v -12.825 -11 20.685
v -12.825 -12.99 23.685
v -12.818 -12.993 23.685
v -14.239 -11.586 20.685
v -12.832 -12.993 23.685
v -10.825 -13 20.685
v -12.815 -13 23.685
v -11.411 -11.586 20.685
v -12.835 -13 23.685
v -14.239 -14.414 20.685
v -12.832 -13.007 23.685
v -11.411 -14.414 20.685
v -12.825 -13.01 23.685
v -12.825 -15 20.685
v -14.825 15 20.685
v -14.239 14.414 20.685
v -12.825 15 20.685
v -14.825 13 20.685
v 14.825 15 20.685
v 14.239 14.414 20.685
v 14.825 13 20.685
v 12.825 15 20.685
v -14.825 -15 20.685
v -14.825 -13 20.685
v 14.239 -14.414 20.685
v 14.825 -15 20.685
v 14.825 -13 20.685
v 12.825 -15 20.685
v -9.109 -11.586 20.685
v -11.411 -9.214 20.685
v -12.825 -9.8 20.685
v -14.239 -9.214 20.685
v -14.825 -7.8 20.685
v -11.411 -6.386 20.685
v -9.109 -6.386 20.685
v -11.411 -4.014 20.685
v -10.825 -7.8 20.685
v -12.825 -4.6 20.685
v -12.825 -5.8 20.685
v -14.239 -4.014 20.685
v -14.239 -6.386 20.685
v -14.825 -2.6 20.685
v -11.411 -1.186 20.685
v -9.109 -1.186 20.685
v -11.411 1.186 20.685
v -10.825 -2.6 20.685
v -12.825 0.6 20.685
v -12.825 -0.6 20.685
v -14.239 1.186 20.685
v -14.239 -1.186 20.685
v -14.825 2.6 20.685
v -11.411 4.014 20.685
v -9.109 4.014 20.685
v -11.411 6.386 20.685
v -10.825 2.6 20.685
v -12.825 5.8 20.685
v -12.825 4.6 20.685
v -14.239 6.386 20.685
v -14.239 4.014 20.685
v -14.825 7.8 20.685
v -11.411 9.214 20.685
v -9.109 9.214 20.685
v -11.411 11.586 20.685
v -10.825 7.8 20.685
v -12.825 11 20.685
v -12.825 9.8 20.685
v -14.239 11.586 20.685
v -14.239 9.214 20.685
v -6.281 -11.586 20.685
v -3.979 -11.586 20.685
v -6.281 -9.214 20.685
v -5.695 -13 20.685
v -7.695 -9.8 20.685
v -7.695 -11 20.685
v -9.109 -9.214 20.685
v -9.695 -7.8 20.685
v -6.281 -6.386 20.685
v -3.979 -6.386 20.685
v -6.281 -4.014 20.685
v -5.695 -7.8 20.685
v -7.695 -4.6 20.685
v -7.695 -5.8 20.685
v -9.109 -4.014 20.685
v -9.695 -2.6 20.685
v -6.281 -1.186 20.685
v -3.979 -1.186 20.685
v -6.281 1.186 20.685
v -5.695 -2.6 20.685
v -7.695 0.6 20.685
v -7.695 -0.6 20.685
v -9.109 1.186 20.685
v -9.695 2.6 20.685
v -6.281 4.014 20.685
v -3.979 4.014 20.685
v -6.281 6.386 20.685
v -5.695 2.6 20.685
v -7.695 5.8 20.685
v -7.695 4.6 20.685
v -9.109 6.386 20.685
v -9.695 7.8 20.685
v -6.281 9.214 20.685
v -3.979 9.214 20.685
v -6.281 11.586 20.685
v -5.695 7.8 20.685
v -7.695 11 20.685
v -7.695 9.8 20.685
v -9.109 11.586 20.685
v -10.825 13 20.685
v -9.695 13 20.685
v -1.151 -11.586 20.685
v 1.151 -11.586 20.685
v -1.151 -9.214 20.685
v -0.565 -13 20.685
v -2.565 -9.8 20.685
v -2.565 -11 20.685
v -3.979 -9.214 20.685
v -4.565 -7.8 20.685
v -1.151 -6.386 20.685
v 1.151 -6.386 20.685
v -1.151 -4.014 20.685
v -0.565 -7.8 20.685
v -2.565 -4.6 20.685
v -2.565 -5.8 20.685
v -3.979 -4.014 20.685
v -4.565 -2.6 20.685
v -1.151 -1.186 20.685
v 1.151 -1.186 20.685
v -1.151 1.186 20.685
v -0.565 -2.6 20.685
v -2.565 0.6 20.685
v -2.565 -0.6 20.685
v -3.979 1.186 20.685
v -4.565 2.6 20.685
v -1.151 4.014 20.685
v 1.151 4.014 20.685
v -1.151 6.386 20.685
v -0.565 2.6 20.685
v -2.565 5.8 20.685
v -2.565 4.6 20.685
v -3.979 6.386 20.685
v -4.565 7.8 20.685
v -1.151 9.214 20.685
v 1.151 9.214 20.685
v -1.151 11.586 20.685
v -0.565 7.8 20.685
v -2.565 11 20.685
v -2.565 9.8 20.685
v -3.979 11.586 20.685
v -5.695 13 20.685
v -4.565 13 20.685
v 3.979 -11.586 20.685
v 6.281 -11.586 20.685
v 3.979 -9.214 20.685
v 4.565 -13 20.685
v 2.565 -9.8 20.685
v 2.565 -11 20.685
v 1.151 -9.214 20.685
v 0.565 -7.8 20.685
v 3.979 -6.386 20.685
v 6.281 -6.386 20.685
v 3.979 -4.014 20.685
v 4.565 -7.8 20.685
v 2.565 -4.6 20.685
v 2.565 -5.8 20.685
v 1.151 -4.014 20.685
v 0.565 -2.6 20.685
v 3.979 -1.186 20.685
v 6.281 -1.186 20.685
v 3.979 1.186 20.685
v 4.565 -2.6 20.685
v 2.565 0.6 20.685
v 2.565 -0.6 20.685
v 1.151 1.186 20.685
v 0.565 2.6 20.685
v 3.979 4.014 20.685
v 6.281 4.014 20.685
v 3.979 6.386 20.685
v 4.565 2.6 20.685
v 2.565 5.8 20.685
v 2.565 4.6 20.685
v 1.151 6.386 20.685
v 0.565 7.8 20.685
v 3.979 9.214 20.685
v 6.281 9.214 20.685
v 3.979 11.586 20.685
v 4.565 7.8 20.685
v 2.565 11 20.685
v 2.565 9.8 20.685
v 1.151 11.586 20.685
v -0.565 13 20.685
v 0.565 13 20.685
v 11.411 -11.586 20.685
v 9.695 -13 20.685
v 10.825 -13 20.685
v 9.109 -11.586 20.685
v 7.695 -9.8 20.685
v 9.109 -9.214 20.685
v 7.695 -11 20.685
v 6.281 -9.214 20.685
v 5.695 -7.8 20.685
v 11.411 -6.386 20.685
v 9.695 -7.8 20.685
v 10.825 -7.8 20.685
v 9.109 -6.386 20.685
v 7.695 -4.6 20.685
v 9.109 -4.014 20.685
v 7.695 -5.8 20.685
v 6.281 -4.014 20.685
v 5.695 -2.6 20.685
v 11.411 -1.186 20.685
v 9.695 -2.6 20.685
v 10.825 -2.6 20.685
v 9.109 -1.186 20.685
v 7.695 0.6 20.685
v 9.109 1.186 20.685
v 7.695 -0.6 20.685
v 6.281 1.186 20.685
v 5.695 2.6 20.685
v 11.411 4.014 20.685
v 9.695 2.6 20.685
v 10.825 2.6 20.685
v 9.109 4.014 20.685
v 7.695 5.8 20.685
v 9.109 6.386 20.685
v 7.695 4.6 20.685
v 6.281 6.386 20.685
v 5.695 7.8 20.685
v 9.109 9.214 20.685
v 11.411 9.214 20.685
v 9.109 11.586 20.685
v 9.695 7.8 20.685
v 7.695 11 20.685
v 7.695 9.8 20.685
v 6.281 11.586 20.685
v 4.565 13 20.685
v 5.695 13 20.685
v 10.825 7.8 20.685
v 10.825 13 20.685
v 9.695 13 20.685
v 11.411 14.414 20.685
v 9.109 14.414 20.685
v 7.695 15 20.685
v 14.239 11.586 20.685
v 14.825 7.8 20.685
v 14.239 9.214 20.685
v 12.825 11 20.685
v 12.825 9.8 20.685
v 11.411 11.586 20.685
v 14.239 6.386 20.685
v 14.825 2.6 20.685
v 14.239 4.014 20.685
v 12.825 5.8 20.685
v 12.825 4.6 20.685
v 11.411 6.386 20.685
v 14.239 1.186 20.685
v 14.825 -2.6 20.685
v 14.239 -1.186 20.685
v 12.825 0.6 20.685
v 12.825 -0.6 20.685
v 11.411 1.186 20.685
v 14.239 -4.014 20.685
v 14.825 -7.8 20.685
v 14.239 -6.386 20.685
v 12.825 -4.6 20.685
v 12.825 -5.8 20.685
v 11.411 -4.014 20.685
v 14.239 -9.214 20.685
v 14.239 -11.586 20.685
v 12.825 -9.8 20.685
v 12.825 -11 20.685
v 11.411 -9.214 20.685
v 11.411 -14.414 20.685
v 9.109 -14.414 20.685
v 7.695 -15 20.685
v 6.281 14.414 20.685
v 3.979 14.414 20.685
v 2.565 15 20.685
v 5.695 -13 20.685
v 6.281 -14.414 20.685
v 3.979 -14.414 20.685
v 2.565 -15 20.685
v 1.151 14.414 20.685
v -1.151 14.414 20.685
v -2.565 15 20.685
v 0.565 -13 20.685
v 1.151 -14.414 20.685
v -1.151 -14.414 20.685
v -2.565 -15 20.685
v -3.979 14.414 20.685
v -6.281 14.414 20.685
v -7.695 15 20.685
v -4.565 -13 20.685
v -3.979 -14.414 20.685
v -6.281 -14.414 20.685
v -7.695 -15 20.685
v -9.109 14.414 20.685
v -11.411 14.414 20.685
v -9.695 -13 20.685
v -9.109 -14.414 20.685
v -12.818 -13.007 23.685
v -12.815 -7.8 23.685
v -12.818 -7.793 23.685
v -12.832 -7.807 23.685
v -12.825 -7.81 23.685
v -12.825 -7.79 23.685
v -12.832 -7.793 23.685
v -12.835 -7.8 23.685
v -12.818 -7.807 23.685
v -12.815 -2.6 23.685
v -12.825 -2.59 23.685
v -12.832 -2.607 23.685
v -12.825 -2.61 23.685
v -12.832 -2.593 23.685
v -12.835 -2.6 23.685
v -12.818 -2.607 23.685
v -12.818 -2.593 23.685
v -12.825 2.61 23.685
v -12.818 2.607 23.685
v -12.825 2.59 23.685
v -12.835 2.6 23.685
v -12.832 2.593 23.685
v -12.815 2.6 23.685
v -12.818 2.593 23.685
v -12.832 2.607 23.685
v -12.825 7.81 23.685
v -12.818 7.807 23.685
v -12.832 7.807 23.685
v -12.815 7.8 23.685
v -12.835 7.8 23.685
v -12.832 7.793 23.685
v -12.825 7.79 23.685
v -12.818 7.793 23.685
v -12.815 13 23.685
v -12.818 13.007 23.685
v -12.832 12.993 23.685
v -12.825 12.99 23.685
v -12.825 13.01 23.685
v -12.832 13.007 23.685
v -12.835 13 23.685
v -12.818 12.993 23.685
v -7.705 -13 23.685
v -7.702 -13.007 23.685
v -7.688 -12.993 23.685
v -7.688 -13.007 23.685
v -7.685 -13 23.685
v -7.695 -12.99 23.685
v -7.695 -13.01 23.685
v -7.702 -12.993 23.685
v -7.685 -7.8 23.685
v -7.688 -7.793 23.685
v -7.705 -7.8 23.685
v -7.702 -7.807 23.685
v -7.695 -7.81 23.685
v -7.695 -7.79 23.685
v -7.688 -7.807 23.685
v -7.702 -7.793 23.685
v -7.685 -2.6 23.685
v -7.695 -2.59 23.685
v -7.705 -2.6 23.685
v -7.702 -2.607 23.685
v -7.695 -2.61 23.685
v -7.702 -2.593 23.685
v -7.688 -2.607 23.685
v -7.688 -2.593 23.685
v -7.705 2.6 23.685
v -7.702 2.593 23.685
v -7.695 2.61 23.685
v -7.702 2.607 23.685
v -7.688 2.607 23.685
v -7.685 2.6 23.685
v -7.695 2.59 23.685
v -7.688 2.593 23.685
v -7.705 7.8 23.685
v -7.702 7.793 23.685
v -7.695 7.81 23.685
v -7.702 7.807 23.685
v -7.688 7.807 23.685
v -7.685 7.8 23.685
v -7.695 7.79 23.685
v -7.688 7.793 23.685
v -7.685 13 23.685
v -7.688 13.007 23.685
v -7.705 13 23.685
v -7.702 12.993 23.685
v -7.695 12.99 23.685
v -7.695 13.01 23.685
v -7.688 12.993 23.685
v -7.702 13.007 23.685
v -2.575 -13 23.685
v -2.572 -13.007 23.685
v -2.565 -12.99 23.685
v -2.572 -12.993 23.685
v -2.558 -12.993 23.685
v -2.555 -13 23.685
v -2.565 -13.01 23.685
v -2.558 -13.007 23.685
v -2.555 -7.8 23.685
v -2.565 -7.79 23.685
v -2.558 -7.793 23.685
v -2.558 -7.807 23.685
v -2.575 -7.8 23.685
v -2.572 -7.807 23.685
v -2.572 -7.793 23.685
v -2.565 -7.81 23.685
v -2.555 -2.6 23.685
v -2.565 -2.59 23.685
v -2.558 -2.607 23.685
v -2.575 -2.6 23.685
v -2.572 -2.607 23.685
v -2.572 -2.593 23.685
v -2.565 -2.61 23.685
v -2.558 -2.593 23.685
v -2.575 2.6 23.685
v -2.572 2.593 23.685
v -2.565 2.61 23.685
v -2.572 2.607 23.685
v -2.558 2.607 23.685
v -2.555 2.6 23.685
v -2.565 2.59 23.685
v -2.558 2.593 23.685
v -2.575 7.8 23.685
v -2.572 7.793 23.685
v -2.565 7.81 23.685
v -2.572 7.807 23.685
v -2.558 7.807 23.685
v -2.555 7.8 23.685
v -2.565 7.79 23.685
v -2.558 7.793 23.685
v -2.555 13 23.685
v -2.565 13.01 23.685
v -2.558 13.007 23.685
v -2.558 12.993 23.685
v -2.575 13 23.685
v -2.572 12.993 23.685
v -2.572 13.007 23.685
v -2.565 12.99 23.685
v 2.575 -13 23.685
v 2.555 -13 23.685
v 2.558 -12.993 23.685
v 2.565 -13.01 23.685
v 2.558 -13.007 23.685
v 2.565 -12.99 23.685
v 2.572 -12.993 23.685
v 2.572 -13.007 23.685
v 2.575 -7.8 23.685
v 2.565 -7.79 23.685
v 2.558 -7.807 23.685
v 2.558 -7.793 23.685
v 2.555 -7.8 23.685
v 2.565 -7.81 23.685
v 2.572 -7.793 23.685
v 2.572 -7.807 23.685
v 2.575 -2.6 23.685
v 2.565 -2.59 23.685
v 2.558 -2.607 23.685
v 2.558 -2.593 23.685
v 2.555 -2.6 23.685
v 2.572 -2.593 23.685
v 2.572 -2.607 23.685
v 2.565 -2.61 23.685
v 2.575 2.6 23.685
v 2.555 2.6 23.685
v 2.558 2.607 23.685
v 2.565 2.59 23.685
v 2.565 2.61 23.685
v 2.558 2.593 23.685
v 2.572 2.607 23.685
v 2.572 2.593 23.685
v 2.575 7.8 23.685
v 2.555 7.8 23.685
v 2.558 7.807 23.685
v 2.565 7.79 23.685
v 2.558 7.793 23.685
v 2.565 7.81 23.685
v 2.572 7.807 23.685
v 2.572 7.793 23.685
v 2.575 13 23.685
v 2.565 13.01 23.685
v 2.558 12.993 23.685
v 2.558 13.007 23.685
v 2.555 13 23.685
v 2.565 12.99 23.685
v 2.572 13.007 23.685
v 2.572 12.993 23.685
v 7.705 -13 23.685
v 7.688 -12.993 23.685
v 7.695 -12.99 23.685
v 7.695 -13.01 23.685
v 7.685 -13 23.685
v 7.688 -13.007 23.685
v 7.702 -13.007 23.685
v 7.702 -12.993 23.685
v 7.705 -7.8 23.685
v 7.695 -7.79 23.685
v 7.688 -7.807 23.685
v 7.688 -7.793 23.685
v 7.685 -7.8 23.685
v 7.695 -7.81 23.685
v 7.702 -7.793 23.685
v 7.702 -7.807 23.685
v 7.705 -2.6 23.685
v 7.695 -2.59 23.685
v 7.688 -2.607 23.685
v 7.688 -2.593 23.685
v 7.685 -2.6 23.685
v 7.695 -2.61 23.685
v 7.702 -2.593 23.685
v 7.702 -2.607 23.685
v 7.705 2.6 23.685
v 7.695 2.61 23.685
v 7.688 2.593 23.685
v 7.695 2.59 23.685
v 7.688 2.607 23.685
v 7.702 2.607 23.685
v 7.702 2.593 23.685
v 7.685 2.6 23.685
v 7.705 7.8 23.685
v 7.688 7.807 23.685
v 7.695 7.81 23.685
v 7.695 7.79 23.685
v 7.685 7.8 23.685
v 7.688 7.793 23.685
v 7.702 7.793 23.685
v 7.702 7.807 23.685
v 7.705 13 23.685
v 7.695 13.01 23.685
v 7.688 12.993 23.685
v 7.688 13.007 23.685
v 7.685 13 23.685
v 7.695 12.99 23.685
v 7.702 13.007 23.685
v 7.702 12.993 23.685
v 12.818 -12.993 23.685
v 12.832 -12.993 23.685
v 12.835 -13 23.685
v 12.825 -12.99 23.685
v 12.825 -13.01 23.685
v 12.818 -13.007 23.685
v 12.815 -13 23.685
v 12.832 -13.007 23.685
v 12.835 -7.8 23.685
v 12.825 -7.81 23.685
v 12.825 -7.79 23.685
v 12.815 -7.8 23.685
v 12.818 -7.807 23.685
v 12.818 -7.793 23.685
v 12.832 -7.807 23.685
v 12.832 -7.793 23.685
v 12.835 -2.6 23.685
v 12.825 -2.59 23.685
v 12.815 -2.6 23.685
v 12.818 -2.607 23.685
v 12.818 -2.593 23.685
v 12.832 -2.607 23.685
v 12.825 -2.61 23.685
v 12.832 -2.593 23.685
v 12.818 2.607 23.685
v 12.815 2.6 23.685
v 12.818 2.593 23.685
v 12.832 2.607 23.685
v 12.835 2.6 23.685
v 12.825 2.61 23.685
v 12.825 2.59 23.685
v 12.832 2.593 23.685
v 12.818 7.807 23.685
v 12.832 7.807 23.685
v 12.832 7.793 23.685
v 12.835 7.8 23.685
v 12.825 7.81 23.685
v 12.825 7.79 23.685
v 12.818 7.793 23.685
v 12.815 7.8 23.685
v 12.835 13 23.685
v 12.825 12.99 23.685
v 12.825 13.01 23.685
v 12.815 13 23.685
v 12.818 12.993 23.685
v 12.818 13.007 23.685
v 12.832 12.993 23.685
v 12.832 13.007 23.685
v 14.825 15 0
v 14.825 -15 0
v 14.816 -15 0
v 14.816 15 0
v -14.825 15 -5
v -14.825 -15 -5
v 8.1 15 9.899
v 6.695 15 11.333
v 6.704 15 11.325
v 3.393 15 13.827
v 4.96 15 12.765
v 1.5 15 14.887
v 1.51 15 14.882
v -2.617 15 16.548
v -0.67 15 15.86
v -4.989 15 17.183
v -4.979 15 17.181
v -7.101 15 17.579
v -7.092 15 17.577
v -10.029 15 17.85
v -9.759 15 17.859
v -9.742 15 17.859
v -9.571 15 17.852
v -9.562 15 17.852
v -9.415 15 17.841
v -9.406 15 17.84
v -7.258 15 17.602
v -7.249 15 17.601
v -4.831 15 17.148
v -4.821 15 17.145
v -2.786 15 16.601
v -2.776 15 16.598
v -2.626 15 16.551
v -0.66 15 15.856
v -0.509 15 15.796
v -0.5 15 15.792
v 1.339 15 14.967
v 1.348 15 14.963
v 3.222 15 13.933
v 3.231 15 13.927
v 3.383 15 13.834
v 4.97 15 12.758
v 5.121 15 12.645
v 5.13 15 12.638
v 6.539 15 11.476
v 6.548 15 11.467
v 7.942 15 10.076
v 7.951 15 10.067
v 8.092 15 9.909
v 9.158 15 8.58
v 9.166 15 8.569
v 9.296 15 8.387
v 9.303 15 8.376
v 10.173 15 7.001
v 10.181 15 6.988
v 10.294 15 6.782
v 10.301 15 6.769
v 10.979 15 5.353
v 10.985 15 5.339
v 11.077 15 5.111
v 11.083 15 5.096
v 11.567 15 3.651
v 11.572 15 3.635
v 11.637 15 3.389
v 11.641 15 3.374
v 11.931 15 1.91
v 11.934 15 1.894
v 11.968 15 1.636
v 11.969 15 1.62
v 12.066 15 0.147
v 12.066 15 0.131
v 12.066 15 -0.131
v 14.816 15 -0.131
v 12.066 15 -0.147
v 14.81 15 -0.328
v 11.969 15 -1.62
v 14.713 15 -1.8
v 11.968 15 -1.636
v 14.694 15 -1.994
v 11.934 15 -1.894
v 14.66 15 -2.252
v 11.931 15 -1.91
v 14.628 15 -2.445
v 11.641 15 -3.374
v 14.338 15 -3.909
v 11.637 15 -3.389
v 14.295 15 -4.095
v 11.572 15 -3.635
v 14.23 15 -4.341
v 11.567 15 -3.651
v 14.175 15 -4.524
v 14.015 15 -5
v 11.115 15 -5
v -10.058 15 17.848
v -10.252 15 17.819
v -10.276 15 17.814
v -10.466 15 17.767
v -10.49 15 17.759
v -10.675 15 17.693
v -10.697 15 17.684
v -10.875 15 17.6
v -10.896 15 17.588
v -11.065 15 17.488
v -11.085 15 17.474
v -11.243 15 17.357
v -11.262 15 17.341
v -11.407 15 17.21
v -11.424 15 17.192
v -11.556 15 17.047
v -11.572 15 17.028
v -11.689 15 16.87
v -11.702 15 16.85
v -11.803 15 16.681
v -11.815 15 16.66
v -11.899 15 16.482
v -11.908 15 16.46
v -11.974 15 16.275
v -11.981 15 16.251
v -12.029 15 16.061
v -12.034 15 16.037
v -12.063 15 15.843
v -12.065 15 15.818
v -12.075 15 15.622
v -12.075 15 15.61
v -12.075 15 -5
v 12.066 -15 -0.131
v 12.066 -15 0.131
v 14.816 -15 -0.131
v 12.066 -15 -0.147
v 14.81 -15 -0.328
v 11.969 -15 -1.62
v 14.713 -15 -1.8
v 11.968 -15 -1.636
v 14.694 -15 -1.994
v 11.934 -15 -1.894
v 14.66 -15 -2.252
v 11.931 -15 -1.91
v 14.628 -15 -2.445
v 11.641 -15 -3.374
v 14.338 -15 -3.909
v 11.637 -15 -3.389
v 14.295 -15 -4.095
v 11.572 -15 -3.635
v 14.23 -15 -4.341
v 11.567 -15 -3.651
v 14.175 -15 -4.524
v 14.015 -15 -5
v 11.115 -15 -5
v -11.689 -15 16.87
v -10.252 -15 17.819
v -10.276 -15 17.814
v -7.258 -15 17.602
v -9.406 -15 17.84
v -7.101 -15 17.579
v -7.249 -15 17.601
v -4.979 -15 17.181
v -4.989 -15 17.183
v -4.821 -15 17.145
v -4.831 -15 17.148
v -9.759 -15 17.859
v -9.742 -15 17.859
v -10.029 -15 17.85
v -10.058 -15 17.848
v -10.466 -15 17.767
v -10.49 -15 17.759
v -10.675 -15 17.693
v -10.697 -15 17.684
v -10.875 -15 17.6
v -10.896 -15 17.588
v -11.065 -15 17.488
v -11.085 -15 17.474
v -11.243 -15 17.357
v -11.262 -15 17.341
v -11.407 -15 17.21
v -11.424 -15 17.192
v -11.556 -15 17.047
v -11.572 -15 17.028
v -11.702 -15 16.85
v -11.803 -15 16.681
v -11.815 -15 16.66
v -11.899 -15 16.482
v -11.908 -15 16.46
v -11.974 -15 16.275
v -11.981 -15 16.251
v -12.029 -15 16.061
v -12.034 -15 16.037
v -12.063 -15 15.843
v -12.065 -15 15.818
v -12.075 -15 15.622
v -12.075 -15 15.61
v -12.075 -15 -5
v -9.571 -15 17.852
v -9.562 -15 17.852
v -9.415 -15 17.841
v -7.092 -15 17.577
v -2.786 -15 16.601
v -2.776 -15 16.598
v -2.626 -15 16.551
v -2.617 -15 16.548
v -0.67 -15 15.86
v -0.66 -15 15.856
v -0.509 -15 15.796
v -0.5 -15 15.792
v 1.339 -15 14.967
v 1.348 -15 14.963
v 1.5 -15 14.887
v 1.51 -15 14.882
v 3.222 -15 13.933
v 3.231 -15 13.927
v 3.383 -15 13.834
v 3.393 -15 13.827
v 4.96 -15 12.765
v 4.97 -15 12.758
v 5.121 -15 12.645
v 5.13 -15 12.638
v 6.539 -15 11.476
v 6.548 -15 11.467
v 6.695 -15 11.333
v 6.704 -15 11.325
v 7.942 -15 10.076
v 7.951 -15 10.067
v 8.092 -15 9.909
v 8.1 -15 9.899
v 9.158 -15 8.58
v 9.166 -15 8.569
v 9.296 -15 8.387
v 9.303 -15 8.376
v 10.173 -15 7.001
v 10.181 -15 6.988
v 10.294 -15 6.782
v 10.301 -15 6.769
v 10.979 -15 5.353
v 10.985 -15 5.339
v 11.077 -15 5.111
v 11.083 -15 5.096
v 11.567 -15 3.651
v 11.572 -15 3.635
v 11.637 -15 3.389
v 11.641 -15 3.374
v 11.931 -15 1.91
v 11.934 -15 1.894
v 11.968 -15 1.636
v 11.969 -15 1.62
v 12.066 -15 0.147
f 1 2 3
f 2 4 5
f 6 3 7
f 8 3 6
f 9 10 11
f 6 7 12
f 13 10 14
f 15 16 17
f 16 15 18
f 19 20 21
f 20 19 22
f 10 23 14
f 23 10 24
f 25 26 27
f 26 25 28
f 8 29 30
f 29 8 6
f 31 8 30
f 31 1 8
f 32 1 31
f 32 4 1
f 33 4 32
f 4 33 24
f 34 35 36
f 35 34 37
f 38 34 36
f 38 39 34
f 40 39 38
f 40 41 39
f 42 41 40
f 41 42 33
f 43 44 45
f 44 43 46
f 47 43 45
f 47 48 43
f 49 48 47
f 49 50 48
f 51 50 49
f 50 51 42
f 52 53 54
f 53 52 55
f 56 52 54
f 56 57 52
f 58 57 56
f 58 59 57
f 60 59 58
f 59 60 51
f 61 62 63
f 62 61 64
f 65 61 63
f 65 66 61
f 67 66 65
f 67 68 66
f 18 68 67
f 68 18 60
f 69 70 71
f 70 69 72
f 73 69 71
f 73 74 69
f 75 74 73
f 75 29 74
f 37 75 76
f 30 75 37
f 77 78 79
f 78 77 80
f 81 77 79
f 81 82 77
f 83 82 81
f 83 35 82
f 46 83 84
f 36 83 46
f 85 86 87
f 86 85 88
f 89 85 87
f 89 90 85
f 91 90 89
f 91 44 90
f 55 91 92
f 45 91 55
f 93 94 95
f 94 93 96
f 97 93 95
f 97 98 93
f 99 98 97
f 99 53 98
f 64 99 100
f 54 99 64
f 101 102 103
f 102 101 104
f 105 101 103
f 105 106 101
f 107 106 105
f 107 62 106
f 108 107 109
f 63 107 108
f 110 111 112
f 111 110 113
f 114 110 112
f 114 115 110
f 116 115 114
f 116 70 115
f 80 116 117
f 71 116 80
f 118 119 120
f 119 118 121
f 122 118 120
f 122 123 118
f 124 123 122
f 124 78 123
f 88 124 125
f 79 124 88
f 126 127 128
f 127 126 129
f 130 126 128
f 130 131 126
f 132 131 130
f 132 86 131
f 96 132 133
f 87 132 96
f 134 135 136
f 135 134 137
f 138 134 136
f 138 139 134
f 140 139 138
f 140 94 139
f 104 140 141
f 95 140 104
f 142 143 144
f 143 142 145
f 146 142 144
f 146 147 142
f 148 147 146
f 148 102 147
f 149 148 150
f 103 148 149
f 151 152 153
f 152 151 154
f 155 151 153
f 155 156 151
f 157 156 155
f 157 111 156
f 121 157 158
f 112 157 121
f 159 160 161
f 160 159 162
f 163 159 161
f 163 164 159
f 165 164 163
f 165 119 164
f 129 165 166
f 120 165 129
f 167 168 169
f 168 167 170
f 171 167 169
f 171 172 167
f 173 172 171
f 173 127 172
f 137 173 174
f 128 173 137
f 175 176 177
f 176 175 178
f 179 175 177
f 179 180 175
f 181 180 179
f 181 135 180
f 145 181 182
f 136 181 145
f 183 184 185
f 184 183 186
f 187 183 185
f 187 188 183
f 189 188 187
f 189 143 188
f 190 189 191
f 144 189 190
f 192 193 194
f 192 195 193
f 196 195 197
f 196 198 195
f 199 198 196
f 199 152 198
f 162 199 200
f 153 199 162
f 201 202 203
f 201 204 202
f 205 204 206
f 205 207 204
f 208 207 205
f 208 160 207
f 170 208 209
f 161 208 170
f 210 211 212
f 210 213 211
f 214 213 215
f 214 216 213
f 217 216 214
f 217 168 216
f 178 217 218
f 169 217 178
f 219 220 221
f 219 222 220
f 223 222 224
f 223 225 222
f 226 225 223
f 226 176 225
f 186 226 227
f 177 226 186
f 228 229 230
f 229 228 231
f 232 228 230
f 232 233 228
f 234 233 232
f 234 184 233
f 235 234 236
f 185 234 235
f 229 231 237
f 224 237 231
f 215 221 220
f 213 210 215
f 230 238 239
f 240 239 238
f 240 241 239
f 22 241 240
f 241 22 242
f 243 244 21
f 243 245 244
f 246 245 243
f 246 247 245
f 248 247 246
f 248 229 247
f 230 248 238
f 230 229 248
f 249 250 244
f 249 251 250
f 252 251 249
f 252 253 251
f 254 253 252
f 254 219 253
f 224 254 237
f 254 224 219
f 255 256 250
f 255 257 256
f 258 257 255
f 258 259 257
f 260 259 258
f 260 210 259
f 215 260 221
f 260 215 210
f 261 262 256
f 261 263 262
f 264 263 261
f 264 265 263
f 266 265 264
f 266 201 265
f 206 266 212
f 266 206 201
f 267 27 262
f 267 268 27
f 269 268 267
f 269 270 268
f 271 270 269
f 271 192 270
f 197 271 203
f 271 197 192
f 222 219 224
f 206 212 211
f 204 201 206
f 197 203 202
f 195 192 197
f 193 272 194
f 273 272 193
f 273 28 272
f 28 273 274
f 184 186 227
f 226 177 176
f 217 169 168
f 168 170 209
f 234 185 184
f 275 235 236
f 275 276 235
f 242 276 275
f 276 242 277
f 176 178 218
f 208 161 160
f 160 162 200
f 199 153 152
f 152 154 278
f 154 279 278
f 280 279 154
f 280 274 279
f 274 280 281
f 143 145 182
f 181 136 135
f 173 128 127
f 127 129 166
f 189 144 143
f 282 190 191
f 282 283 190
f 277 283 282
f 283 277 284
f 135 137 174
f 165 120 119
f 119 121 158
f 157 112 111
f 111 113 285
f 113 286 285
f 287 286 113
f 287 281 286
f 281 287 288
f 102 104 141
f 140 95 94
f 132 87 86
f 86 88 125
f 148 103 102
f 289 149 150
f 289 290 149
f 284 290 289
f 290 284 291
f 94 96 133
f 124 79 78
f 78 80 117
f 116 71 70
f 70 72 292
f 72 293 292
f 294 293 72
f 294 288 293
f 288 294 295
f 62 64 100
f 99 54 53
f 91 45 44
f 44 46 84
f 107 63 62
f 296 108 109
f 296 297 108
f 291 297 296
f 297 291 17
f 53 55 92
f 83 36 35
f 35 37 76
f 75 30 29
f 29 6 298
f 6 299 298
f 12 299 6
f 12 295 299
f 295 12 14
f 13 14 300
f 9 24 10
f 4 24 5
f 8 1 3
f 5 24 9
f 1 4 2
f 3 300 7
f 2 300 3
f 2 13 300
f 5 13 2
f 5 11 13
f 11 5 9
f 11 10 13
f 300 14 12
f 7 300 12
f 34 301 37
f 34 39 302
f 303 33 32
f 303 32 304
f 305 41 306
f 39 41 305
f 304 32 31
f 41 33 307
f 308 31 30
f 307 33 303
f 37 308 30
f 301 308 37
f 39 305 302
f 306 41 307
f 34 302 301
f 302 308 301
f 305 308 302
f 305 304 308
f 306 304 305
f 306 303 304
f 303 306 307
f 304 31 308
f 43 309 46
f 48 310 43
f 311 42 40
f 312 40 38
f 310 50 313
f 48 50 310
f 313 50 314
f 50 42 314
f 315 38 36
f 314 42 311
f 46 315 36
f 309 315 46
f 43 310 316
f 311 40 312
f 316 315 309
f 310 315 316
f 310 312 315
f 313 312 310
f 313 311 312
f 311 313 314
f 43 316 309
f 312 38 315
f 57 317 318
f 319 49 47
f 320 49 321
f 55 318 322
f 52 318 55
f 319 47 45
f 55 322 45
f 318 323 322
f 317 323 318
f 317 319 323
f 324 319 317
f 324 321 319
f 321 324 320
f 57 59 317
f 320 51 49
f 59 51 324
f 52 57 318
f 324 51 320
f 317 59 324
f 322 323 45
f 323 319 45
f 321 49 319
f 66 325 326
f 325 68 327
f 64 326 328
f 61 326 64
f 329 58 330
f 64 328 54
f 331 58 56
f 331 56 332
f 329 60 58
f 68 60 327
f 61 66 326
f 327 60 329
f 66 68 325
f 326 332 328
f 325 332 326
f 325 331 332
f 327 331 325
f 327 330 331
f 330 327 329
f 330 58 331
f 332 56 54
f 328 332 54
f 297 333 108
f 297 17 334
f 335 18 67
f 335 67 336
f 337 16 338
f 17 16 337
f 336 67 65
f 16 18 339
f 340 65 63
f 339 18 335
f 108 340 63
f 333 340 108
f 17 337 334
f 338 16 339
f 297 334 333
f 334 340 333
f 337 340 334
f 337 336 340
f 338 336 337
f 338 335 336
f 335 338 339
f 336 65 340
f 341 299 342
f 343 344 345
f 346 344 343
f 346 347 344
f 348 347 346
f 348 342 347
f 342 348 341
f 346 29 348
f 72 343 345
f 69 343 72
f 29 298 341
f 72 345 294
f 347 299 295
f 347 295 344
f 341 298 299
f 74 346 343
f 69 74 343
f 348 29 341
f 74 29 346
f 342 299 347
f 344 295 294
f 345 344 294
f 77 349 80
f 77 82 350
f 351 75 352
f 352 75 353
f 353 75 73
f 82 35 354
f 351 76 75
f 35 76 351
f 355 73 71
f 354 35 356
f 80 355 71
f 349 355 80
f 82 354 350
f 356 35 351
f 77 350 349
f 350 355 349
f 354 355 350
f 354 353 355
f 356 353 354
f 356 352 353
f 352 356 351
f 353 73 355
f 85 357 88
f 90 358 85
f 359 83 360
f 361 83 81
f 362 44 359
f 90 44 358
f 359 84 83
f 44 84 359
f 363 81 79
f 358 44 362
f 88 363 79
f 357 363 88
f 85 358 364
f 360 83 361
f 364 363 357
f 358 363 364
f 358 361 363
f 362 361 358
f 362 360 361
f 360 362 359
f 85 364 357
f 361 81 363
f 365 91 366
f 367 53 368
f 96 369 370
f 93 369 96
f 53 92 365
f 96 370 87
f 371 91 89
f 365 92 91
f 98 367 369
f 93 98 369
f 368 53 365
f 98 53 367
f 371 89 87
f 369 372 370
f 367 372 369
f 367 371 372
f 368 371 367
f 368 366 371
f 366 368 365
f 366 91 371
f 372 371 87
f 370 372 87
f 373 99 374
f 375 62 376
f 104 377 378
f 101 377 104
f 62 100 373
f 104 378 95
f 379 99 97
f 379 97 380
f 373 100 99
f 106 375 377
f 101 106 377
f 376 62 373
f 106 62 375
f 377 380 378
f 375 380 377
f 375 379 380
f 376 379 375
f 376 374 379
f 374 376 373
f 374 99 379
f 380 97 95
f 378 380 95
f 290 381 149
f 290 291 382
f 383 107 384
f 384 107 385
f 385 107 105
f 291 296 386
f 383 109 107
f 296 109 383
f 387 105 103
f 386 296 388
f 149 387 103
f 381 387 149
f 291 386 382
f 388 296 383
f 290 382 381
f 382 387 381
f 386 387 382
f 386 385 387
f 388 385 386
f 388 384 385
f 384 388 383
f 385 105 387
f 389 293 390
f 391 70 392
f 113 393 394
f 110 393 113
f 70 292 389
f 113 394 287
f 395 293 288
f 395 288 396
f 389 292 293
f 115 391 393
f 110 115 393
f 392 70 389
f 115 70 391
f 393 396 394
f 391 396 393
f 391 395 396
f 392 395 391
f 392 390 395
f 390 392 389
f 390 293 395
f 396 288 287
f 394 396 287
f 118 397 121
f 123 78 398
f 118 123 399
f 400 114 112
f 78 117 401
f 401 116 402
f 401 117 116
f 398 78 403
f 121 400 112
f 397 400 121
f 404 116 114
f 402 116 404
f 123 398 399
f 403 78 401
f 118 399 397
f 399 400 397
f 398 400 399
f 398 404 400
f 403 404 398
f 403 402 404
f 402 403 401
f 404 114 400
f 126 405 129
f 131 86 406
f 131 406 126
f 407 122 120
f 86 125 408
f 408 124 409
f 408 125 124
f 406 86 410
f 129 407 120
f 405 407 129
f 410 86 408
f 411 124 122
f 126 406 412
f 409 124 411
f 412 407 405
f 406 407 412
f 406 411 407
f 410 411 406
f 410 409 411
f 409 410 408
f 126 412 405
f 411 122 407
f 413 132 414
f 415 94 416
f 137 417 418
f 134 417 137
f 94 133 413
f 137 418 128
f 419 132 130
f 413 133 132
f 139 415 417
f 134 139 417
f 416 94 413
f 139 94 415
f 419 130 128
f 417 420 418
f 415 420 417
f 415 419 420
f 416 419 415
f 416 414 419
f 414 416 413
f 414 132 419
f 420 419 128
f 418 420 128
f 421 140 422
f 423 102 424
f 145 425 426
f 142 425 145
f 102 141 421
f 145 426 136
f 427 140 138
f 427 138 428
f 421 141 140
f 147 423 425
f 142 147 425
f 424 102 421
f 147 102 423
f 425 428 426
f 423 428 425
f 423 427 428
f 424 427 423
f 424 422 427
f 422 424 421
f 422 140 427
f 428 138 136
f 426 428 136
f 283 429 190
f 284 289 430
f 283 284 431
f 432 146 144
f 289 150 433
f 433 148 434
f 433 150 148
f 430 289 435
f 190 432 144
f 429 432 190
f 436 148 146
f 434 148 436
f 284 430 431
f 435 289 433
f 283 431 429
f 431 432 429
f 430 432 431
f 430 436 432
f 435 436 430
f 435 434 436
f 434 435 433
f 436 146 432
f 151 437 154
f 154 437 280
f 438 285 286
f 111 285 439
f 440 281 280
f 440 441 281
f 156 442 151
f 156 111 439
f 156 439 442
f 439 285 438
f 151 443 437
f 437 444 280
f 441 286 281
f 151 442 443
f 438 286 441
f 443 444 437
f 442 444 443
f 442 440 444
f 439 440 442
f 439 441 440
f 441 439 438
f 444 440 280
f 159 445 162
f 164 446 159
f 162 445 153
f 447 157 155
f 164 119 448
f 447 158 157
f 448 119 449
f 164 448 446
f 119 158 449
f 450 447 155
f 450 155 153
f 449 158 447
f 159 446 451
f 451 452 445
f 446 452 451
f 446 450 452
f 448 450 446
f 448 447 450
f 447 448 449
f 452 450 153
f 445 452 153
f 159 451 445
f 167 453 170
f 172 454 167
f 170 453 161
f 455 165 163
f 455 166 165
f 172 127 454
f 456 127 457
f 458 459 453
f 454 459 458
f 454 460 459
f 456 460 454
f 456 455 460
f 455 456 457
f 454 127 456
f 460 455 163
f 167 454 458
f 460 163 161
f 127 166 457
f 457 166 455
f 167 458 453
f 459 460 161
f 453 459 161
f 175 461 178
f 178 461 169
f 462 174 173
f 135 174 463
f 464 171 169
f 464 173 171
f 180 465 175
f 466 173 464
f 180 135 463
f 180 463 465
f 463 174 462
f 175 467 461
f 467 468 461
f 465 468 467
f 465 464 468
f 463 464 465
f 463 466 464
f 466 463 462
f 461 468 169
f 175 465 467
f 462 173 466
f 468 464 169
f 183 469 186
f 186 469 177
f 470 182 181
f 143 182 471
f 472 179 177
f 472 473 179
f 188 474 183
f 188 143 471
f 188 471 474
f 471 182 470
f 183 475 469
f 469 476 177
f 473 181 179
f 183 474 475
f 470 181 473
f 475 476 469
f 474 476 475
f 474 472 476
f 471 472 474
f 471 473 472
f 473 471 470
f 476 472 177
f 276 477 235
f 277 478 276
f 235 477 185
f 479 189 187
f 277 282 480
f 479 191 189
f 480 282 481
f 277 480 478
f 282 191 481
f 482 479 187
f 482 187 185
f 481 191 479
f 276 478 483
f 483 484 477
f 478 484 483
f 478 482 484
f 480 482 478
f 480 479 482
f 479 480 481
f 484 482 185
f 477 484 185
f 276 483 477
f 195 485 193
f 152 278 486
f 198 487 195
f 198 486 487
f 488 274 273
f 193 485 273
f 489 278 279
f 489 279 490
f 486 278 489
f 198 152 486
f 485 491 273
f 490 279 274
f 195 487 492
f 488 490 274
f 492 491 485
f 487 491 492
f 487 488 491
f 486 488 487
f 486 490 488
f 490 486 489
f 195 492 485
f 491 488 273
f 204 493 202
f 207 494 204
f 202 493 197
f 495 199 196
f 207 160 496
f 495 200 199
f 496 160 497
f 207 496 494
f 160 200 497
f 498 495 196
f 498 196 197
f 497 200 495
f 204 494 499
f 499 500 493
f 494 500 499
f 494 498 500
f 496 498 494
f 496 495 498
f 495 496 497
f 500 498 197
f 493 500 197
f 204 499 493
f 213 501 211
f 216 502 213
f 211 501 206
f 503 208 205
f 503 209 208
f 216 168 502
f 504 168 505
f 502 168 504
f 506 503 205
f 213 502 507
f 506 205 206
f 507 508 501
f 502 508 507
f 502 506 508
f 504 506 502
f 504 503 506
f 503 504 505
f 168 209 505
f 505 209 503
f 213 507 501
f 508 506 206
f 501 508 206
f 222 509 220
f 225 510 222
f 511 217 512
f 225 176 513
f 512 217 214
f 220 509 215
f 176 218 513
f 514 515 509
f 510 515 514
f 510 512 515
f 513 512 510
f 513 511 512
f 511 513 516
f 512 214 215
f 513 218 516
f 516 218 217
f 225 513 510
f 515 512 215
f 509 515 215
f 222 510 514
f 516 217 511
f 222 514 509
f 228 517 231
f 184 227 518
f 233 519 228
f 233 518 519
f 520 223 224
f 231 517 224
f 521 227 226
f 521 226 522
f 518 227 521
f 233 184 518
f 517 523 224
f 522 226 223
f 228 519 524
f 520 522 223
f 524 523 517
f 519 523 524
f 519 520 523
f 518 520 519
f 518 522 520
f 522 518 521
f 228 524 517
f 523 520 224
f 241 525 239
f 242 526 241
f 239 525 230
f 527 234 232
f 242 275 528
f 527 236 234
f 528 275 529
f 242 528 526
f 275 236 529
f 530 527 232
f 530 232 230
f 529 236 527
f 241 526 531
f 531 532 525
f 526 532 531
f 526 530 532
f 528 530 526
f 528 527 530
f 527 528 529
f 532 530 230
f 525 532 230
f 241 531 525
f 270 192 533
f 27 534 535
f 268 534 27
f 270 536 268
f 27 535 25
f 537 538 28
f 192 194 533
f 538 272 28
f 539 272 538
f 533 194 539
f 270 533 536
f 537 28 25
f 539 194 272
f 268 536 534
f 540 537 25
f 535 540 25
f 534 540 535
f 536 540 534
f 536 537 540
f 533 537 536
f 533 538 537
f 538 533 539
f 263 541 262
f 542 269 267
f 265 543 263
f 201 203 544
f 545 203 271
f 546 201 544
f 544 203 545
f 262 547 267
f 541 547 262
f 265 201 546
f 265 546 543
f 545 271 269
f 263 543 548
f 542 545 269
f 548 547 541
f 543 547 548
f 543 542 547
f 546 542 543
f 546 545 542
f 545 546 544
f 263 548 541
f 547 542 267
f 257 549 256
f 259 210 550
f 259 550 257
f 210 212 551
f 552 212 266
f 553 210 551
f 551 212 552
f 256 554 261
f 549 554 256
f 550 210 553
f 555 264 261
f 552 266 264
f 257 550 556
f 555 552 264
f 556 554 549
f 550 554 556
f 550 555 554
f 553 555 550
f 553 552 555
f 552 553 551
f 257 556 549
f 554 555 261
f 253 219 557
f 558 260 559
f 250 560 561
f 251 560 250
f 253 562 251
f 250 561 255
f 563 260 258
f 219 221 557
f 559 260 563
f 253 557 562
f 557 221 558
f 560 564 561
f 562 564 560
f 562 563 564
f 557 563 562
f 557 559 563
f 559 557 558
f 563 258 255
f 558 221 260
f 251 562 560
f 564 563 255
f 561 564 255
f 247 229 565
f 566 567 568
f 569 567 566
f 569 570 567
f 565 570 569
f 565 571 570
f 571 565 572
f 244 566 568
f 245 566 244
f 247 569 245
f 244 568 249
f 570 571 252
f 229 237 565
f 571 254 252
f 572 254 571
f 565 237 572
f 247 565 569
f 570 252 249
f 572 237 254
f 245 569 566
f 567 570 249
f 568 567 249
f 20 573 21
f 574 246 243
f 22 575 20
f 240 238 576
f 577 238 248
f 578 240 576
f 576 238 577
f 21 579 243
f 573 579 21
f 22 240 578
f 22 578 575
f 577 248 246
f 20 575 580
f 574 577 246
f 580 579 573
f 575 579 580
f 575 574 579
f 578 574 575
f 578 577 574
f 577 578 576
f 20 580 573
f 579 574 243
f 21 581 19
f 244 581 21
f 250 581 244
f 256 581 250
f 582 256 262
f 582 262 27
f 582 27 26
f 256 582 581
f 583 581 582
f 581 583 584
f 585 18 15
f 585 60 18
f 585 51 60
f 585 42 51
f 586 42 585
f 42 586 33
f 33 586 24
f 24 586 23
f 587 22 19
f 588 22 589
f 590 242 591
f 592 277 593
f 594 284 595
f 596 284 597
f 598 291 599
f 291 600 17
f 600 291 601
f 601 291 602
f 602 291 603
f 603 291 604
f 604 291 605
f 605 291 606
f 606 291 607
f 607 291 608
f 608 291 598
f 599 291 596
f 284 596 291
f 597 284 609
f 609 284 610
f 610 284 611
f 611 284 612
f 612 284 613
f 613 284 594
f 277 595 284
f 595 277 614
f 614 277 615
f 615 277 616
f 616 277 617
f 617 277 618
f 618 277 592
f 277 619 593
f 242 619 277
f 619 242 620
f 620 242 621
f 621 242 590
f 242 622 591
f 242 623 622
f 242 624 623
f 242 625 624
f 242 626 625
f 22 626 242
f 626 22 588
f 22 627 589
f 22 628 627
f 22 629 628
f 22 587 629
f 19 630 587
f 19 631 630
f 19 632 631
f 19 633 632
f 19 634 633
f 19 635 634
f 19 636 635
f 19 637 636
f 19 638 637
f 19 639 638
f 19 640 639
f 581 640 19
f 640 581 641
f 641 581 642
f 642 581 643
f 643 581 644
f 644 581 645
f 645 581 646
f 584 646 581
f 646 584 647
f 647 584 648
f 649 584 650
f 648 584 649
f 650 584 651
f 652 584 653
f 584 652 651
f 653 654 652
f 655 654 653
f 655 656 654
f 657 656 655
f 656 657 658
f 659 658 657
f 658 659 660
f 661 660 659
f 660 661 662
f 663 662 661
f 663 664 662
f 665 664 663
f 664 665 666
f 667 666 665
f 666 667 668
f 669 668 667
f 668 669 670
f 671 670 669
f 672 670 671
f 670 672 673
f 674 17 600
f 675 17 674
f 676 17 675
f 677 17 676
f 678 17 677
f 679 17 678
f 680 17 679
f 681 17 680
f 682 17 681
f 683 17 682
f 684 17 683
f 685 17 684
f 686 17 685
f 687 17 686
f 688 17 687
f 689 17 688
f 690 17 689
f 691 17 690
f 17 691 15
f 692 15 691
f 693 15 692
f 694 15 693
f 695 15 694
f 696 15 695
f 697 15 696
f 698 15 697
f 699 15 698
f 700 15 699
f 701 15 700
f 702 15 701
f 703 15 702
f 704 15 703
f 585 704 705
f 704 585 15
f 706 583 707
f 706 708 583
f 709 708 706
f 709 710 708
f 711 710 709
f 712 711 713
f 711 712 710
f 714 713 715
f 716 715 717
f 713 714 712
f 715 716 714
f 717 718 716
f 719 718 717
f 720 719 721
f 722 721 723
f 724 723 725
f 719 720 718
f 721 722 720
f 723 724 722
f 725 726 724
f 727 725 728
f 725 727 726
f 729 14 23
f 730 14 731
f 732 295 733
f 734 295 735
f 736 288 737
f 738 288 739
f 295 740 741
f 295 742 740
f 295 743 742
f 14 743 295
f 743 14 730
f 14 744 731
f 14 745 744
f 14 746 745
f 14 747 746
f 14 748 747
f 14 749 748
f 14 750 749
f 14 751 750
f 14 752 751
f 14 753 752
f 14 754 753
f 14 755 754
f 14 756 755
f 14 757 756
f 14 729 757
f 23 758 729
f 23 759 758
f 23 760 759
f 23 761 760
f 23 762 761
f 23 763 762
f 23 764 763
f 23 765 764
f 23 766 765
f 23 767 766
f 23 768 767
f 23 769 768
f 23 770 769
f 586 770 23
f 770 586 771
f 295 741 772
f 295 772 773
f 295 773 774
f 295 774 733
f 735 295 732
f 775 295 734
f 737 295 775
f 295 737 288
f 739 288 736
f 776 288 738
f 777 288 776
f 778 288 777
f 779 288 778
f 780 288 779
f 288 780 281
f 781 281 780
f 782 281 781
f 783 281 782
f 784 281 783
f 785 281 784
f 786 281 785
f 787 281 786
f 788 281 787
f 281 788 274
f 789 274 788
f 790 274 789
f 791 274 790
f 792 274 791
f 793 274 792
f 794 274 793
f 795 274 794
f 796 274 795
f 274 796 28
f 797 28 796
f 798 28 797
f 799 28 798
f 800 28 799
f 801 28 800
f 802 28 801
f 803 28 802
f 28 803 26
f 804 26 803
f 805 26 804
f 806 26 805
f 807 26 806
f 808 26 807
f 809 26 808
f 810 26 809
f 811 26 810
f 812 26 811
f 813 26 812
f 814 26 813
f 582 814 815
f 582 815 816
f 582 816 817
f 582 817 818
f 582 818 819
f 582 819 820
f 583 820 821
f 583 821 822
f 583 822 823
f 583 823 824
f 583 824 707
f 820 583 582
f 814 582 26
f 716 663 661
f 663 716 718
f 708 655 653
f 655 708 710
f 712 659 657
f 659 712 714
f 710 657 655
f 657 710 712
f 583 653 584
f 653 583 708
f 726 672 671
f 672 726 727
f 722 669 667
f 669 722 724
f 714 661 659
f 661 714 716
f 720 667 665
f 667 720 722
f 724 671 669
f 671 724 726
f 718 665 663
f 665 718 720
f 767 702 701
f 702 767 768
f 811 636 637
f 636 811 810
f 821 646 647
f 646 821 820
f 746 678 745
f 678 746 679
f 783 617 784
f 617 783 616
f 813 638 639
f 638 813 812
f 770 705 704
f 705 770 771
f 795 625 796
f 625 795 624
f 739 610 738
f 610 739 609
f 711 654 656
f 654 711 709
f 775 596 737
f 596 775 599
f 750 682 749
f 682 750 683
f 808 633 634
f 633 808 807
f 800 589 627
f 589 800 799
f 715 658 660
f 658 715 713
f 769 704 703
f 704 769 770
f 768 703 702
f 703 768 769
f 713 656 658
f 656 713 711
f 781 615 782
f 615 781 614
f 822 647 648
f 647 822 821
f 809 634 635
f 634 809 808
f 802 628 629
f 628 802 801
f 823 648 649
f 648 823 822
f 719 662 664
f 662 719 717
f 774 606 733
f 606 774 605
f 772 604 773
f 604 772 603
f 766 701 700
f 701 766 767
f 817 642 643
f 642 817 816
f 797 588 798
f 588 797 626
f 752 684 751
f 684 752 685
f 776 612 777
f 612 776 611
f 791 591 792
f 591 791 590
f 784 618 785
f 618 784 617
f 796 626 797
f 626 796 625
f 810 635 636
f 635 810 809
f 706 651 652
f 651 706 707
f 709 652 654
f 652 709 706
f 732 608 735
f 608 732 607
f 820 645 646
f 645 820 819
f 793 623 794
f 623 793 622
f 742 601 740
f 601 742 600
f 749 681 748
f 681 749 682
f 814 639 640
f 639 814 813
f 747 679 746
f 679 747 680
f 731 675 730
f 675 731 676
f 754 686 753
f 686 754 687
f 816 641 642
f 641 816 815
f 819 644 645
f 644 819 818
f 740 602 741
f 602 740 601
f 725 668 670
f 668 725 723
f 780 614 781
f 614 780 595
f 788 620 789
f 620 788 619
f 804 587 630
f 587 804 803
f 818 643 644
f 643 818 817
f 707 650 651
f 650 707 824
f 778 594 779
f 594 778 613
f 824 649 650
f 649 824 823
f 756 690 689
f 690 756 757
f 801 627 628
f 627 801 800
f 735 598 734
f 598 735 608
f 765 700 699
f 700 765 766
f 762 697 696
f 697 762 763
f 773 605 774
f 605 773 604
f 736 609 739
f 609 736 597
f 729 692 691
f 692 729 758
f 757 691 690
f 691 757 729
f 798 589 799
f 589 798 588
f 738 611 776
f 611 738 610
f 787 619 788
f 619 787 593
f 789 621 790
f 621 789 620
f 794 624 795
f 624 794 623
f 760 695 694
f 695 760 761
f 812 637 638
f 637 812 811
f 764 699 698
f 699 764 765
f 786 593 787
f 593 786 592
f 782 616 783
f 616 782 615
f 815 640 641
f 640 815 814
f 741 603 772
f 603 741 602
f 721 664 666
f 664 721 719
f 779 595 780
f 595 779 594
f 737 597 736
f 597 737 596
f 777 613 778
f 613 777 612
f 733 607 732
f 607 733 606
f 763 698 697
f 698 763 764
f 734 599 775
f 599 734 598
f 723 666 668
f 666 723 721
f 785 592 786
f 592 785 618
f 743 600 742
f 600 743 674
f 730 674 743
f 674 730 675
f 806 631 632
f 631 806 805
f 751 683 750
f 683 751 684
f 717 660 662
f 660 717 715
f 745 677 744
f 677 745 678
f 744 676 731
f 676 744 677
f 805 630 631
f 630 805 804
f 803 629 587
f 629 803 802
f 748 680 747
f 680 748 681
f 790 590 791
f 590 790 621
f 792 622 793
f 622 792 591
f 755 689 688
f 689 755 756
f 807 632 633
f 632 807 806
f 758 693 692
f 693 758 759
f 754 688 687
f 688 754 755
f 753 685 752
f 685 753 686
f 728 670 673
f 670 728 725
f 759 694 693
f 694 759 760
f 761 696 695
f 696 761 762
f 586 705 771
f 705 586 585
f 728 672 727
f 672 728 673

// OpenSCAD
// Oven Handle Towel Grippy
$fn = 64;

// Oven Handle Dimensions
// Rounded semi-ellipctical shape
handle_horiz_rad = 23.65;
handle_vert_dia  = 35.37;
rounding = 2.0;
handle_mid_dist = 60.35;
handle_end_dist = 32.70;
handle_length = 673.1;

// Grippy Dimensions
spacing = 0.25;
grippy_len = 30.0;
grippy_wall_thick = 3.0;
spike_h = 3.0;
spike_rad = 2.0;

module ellipse(length, width) {
    scale([length/2, width/2, 1])
    circle(r=1);
}

module ovenHandle2D() { // Cross section of oven handle
    offset(rounding) offset(-rounding)
    difference() {
        ellipse(handle_vert_dia, handle_horiz_rad*2);
        translate([-handle_vert_dia/2, -handle_horiz_rad])
        square([handle_vert_dia, handle_horiz_rad]);
    }
}

module ovenHandleSegment3D() {
    translate([-(handle_horiz_rad)/2,-grippy_len/2,0])
    rotate([90,-90,180])
    linear_extrude(grippy_len)
    offset(spacing)
    ovenHandle2D();
}

module spike3D() {
    cylinder(spike_h, spike_rad, 0.01, $fn = 8);
}

module grippyTop3D() {
    z_offset = grippy_wall_thick + handle_vert_dia / 2;

    // Create the top cube
    cube([2 * grippy_wall_thick + handle_horiz_rad, grippy_len, z_offset], center = true);

    // Define the bounds for spike placement, inset by spike radius
    x_start = -(grippy_wall_thick + handle_horiz_rad / 2) + spike_rad;  // Inset by spike radius
    x_end = grippy_wall_thick + handle_horiz_rad / 2 - spike_rad;       // Inset by spike radius
    y_start = -grippy_len / 2 + spike_rad;                              // Inset by spike radius
    y_end = grippy_len / 2 - spike_rad;                                 // Inset by spike radius

    // Calculate the number of spikes that fit in each direction
    num_spikes_x = floor((x_end - x_start) / (2 * spike_rad));
    num_spikes_y = floor((y_end - y_start) / (2 * spike_rad));

    // Calculate actual spacing to distribute spikes evenly
    actual_spacing_x = (x_end - x_start) / max(1, (num_spikes_x - 1));
    actual_spacing_y = (y_end - y_start) / max(1, (num_spikes_y - 1));

    // Loop to place spikes evenly on the top surface
    for (i = [0 : num_spikes_x - 1]) {
        for (j = [0 : num_spikes_y - 1]) {
            x = x_start + i * actual_spacing_x;
            y = y_start + j * actual_spacing_y;
            translate([x, y, z_offset / 2]) {
                spike3D();
            }
        }
    }
}



module grippy3D() {
    difference () {
    union() {
        translate([-(handle_horiz_rad)/2,-grippy_len/2,0])
        rotate([90,-90,180])
        linear_extrude(grippy_len)
        offset(grippy_wall_thick)
        ovenHandle2D();
        translate([0,0,(grippy_wall_thick+handle_vert_dia/2)/2])
        grippyTop3D();
    }
    ovenHandleSegment3D();
    translate([0,0,-30])
    #cube([50,50,50], center = true);
    }
}


grippy3D();
//spike3D();
